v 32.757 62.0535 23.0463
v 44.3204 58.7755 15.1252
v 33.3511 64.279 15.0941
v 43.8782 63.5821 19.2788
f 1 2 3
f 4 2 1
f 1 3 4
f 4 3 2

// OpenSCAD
// Auto-generated auxetic polyhedron
points = [
    [33.351141, 64.278976, 15.094102],
    [44.320422, 58.775453, 15.125200],
    [32.756988, 62.053502, 23.046276],
    [43.878245, 63.582095, 19.278847],
];

faces = [
    [0, 1, 2],
    [2, 1, 3],
    [3, 0, 2],
    [1, 0, 3],
];

polyhedron(points = points, faces = faces);
